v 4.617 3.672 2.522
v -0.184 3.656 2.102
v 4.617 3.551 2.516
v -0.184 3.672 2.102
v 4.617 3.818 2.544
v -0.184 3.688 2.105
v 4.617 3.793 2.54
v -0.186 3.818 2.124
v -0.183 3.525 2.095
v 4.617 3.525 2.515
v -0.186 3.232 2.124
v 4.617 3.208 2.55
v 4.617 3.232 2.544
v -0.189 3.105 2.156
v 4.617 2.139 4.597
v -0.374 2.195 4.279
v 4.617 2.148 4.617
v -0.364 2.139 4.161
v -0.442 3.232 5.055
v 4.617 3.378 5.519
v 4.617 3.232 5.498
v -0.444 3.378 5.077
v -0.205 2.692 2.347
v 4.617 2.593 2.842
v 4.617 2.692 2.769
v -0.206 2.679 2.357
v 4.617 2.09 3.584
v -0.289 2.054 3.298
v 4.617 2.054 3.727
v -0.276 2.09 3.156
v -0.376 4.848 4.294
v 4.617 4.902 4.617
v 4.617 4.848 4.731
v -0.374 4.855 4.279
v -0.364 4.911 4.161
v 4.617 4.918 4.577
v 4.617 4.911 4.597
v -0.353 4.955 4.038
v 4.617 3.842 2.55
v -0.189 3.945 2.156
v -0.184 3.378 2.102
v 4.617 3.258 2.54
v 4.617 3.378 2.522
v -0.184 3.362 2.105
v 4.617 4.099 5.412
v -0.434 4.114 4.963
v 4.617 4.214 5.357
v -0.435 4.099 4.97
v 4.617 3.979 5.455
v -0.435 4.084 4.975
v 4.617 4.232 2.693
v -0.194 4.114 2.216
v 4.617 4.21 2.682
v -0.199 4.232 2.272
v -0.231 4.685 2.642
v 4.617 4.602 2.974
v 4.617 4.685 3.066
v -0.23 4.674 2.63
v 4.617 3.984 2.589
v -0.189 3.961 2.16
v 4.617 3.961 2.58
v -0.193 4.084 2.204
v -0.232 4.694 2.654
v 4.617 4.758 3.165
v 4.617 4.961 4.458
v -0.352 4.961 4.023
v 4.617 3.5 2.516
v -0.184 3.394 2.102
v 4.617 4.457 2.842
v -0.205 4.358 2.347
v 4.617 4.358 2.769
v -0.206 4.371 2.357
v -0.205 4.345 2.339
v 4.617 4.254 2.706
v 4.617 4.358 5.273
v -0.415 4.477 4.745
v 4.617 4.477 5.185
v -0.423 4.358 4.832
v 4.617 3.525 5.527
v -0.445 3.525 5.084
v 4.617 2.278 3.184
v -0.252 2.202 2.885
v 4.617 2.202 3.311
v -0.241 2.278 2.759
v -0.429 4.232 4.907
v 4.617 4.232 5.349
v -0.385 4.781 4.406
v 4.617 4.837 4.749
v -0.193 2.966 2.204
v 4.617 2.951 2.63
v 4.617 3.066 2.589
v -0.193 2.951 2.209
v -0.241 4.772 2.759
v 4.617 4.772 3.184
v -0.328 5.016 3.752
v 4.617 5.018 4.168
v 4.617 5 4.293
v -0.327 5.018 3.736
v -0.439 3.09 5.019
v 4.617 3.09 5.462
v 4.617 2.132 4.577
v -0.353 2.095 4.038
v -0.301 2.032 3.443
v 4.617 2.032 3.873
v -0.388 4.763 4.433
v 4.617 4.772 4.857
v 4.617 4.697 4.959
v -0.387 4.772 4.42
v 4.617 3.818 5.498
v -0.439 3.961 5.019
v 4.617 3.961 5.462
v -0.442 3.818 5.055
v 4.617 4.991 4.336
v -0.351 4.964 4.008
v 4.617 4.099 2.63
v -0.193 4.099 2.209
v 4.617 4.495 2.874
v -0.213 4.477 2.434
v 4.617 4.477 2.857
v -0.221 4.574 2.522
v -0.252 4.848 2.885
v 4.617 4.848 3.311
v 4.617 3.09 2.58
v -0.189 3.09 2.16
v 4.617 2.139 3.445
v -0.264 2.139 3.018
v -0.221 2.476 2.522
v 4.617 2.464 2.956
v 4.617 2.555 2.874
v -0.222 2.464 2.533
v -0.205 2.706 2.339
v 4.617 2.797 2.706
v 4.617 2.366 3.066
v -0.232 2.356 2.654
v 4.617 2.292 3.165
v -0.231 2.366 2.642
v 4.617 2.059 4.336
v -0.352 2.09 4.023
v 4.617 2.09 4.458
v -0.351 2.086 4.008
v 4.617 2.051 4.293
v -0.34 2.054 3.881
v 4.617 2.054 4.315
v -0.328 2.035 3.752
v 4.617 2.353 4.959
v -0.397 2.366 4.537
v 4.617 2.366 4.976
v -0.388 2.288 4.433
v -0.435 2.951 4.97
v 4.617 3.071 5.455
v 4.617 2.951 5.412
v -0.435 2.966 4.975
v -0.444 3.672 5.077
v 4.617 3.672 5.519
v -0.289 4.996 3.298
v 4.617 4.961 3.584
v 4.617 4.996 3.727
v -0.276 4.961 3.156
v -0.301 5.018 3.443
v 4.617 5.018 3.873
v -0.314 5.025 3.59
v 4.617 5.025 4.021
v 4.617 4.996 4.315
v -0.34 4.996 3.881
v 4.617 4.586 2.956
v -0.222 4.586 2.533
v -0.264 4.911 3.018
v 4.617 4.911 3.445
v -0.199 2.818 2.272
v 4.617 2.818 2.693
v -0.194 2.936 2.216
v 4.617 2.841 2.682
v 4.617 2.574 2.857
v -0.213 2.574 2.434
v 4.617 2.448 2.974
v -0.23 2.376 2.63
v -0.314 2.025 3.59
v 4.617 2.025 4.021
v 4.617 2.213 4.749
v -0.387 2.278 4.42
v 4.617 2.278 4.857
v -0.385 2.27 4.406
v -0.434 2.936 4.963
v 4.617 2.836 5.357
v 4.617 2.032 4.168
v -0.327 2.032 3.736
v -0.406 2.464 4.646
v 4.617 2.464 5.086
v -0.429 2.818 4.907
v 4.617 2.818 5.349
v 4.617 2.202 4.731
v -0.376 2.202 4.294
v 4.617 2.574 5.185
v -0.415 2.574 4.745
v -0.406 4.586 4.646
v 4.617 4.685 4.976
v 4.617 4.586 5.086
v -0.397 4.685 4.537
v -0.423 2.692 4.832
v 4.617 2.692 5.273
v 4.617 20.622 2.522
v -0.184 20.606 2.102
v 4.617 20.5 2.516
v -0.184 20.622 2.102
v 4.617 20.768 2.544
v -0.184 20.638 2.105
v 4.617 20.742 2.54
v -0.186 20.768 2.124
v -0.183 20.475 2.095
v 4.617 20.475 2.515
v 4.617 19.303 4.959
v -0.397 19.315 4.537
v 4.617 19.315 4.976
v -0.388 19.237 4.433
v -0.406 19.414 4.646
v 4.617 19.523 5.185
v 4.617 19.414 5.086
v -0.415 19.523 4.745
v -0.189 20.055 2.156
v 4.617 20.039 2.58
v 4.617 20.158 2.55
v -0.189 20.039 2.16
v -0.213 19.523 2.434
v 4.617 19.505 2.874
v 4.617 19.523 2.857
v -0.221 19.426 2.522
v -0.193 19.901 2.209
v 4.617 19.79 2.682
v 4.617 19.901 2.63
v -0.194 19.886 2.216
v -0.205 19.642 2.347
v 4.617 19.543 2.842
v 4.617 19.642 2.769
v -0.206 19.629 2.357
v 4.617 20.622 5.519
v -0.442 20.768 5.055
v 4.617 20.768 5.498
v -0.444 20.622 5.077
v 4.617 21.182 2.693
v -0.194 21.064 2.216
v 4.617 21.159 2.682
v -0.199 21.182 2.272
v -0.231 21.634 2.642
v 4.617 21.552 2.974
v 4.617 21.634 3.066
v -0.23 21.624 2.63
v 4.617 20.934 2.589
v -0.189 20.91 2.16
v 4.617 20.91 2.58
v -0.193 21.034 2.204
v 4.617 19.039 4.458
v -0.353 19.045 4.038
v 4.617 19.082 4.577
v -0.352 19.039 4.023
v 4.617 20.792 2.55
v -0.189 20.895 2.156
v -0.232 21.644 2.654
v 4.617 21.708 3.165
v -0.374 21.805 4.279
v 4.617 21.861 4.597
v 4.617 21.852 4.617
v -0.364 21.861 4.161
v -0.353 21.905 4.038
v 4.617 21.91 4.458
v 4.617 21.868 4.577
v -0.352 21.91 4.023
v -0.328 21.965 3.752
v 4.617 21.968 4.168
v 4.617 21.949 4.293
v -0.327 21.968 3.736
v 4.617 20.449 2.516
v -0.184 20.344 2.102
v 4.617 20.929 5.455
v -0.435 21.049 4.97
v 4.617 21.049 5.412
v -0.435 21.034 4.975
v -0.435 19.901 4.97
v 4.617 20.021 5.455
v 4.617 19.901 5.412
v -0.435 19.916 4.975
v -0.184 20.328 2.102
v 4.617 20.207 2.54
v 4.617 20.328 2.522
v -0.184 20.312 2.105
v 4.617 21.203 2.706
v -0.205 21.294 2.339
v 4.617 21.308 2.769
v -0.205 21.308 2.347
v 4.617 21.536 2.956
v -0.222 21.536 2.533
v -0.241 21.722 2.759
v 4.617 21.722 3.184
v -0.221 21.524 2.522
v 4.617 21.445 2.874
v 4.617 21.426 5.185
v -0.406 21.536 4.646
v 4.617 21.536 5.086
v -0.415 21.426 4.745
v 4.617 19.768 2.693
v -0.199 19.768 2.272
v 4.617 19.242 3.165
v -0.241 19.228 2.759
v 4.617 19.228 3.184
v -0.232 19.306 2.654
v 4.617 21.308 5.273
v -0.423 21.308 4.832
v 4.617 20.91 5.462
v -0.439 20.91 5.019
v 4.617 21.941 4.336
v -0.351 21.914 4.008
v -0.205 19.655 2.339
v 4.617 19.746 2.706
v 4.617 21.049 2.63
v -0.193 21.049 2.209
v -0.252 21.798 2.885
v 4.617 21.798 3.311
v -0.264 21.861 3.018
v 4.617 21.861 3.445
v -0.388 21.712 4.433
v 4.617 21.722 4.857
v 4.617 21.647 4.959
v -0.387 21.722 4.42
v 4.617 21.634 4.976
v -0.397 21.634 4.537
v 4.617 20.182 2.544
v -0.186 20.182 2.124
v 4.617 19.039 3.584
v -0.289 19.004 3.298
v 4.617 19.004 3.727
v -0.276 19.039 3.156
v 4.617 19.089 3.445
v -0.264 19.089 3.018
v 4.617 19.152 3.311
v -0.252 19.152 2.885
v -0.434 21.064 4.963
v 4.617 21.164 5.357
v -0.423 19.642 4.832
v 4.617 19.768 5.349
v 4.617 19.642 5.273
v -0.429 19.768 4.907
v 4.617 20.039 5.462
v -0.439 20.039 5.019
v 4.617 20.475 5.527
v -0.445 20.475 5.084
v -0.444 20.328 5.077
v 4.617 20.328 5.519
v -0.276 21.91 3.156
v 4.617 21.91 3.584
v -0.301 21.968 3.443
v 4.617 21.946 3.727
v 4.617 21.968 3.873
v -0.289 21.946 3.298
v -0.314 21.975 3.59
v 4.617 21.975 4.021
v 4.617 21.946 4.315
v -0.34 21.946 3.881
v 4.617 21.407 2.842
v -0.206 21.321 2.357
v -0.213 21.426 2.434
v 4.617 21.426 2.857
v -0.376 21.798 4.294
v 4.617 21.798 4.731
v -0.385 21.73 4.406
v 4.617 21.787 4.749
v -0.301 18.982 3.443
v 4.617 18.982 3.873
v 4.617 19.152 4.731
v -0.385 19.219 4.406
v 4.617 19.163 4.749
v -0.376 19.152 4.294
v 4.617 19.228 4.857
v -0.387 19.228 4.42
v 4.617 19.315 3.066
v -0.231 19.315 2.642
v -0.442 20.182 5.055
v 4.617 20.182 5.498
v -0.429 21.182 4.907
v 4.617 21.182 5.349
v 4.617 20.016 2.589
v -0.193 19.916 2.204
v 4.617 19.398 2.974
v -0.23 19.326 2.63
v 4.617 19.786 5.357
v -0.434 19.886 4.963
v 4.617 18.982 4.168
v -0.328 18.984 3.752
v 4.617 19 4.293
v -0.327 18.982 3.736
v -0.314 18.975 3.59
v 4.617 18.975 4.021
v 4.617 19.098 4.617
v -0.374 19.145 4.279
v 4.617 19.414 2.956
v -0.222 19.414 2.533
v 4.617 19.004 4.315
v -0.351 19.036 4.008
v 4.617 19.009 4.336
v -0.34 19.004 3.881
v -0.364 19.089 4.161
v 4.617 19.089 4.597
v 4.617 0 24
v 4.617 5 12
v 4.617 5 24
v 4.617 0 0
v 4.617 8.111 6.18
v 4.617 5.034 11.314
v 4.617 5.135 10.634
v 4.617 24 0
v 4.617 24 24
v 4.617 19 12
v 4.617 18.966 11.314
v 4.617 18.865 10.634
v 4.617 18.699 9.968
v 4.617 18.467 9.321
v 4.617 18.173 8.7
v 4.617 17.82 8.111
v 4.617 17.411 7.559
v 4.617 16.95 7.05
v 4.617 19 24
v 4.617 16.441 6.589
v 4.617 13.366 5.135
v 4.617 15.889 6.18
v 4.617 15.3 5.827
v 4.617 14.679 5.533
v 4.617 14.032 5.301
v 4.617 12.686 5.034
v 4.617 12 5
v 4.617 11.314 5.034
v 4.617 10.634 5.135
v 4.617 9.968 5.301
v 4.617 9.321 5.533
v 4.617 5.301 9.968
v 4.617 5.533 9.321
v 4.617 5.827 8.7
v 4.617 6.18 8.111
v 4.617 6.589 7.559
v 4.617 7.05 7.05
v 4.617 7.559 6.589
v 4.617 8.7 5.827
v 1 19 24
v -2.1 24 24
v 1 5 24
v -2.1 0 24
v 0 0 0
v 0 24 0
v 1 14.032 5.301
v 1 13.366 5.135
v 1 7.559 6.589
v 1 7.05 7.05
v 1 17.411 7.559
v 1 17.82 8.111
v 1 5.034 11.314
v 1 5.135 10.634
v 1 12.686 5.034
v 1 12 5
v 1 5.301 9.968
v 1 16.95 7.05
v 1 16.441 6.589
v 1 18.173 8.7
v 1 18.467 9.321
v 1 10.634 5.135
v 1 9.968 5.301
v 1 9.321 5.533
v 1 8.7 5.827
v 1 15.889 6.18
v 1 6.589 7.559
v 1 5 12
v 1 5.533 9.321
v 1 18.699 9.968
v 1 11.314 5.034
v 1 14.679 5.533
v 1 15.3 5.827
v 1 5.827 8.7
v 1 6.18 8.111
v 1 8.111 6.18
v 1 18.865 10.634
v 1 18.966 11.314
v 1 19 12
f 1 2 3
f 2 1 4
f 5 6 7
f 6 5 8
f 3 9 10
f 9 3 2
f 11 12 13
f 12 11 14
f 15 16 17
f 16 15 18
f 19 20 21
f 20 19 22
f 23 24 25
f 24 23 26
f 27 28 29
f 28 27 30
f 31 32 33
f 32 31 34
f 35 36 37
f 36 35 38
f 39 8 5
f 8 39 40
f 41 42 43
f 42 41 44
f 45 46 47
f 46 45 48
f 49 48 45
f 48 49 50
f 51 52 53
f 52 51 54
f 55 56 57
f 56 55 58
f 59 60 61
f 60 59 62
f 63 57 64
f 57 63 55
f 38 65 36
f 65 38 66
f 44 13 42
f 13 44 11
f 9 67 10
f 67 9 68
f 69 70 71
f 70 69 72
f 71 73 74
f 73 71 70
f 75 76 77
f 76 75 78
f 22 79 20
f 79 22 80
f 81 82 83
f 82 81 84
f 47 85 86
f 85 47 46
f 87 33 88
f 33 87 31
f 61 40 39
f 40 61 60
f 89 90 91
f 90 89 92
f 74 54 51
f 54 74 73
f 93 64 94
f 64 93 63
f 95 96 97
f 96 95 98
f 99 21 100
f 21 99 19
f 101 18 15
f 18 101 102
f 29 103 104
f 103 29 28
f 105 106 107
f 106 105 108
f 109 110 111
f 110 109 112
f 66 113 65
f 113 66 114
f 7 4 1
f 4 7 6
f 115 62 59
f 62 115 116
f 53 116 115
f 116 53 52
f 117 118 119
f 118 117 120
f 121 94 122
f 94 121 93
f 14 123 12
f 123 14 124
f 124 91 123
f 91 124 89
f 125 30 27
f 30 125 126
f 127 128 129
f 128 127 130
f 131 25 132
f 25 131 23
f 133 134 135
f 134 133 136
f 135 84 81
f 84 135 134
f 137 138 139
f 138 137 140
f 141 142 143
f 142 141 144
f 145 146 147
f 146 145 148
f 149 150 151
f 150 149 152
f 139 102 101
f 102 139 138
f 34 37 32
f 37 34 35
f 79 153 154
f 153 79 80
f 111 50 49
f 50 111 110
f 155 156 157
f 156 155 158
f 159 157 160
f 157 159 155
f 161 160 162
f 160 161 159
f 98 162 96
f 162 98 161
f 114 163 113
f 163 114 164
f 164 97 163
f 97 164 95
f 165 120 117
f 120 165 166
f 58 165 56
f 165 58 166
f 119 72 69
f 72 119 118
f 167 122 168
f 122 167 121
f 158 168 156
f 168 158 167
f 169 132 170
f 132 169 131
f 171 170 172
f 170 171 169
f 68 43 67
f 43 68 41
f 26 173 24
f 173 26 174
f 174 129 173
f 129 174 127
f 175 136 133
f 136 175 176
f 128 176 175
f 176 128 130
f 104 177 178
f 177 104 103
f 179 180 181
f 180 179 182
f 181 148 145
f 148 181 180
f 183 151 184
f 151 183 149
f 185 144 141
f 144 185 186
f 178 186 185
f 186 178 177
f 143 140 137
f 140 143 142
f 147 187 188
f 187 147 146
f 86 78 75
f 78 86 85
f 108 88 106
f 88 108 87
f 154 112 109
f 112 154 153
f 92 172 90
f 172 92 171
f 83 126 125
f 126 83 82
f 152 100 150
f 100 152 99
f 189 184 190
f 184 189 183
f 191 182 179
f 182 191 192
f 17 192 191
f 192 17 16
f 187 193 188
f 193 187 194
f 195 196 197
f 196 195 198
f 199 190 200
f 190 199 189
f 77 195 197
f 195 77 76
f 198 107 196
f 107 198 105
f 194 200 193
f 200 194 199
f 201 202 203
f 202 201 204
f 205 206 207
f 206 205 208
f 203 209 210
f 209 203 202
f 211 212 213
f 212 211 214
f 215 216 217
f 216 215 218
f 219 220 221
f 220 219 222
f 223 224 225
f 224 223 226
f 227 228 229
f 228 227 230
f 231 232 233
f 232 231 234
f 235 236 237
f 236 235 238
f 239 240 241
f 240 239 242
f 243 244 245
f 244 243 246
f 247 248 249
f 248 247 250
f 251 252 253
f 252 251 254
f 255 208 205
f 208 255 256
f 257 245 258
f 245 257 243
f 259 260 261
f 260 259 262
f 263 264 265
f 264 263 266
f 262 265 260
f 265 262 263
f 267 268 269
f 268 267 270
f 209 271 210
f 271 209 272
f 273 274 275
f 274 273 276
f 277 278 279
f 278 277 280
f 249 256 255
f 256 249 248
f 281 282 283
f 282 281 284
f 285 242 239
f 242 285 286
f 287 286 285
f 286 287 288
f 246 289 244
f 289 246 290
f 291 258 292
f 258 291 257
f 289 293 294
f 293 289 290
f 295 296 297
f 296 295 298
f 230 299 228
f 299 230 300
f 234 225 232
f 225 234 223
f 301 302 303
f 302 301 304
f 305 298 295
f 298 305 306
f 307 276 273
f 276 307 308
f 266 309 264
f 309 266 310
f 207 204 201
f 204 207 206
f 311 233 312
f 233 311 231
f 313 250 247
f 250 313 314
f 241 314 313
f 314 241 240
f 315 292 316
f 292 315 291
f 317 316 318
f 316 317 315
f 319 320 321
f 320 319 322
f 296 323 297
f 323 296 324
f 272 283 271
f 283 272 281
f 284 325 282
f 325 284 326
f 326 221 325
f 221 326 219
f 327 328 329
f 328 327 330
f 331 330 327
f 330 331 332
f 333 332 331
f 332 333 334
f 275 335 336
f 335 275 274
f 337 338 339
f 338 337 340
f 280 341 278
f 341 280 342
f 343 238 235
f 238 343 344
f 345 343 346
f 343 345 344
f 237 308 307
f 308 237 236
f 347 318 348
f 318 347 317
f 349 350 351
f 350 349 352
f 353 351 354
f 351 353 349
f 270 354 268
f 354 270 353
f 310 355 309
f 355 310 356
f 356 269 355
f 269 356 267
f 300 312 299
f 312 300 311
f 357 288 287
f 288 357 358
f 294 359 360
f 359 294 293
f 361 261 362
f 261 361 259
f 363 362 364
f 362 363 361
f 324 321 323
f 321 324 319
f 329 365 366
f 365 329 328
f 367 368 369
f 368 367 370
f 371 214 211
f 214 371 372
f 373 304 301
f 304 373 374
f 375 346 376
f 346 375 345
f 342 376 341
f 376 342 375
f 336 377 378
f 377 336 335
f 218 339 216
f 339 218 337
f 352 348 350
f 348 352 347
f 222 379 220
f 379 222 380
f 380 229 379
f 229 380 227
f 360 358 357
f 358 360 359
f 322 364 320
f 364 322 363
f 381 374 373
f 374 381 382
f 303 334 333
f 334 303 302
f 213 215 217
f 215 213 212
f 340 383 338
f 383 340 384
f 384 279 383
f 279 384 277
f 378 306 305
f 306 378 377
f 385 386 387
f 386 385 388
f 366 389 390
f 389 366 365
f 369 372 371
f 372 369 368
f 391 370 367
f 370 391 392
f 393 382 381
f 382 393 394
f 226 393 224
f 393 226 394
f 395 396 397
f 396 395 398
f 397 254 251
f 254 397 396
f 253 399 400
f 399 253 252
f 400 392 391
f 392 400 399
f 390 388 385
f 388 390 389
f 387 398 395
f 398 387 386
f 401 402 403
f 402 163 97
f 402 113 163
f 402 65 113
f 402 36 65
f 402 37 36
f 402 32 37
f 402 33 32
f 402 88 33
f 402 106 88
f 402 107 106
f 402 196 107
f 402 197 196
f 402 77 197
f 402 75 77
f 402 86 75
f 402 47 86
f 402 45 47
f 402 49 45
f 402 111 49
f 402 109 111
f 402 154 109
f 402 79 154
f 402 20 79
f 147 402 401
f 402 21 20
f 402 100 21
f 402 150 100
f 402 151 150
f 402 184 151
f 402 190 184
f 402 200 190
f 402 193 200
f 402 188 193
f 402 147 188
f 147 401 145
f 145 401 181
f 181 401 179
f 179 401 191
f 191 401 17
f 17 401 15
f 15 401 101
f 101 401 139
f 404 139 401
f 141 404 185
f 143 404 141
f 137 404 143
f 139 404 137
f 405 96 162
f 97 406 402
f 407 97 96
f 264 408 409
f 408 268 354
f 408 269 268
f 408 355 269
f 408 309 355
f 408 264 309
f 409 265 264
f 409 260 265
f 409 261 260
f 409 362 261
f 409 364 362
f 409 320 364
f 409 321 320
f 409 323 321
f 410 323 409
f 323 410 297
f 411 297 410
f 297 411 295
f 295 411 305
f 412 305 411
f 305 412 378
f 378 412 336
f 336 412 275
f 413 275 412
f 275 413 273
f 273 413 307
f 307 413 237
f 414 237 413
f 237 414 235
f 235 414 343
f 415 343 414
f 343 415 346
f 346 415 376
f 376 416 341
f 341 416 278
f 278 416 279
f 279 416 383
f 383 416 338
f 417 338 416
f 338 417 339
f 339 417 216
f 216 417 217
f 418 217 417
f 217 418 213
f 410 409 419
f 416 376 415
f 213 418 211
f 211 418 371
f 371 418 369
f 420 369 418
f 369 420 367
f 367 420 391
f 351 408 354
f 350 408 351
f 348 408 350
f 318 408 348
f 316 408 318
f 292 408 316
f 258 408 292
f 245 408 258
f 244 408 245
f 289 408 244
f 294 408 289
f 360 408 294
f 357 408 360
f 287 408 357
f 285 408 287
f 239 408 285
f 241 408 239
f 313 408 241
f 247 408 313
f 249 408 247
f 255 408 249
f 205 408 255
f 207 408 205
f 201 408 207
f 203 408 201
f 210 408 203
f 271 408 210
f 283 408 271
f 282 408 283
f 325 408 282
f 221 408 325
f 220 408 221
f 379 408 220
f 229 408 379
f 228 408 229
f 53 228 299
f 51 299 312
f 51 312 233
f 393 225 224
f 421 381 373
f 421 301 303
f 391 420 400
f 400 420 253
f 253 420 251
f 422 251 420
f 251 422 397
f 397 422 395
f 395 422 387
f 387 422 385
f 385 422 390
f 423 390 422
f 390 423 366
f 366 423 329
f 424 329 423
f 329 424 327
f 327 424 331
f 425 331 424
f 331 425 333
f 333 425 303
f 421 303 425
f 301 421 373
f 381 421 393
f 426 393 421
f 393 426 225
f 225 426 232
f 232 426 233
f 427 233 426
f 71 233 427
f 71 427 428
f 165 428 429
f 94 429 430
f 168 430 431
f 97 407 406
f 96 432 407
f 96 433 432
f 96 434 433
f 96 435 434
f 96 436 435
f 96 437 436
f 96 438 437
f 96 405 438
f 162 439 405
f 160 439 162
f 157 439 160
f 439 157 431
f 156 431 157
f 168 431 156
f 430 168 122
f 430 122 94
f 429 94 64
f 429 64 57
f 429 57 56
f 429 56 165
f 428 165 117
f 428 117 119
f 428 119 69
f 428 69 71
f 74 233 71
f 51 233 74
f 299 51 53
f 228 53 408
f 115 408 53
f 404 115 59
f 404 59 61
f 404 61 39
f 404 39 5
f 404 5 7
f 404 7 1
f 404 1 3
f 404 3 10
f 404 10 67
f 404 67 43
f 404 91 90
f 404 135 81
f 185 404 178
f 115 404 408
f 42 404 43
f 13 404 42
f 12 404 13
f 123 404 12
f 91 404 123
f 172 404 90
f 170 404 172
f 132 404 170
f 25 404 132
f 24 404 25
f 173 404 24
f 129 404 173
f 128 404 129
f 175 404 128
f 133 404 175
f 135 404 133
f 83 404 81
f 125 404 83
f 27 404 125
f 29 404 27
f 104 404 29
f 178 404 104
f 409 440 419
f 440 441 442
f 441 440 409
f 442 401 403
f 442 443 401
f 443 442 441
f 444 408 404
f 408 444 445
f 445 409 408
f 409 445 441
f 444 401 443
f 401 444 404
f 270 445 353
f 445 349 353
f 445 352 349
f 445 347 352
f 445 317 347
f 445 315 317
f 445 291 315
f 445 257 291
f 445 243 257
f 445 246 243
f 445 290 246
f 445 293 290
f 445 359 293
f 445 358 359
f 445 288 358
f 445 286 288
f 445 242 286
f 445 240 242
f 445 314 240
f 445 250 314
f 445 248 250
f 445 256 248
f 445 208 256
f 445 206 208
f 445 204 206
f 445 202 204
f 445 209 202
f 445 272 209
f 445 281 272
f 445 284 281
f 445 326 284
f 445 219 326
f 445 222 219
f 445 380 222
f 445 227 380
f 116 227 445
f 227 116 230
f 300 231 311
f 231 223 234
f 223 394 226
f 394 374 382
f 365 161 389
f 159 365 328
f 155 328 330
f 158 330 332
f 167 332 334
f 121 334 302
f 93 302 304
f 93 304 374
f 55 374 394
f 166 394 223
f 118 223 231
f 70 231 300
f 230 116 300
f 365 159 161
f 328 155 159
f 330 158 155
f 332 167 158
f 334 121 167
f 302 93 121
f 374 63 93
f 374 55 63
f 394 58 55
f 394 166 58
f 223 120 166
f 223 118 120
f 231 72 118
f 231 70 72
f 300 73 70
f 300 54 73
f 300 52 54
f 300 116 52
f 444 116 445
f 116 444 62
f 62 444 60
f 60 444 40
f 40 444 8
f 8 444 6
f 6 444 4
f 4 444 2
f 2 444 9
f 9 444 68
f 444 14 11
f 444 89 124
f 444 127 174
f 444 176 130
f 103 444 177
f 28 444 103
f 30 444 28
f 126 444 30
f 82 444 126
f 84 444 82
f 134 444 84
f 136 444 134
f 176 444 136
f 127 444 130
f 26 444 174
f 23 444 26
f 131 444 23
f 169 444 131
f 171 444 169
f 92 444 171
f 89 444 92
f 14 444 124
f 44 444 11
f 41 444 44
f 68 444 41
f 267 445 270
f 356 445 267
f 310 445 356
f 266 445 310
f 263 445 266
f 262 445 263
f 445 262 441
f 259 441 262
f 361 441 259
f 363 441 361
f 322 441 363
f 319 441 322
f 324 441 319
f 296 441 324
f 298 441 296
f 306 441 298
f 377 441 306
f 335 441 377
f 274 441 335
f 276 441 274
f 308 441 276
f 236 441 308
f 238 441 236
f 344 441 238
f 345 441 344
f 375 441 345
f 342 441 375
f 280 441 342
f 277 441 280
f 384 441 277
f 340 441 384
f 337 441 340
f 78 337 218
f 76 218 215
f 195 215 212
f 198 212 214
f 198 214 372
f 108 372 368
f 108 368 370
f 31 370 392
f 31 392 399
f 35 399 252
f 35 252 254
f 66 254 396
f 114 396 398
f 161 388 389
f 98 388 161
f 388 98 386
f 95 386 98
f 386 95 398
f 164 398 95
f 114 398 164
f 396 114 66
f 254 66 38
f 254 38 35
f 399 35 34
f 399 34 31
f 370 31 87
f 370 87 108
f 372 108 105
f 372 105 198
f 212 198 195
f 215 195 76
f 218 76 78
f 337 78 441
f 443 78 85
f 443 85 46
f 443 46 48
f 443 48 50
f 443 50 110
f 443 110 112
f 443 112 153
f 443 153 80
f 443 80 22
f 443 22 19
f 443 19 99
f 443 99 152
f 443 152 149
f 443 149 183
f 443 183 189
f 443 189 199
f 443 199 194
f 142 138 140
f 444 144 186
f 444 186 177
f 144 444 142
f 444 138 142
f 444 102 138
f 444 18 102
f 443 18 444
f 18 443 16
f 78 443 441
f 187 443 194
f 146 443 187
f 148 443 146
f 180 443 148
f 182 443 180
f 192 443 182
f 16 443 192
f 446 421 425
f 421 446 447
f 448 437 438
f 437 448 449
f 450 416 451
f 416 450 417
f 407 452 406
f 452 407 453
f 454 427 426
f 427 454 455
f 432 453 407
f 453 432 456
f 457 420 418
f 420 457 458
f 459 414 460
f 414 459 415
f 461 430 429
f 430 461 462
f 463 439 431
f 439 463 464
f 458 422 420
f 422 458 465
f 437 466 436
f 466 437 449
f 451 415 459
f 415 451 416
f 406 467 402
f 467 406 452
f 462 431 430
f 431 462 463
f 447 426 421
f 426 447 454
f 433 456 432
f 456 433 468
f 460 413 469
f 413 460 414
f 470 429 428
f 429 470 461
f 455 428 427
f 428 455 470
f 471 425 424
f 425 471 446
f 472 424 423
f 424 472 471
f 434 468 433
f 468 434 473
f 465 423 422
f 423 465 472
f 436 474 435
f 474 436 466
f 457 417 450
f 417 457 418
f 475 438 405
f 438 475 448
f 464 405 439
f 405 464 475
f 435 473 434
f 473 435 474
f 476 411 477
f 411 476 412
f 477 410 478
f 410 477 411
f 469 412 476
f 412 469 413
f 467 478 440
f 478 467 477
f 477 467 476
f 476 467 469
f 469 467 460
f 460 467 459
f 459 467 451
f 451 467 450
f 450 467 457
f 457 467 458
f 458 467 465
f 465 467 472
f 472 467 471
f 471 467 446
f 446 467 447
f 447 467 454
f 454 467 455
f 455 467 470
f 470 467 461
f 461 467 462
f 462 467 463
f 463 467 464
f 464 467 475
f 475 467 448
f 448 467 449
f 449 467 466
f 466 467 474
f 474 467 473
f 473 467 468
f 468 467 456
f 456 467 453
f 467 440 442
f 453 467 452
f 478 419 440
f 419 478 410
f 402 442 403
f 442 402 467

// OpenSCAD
$fn = $preview ? 16 : 64;

dia = 14;
T = 1;
D = T+dia/3;
w = dia + 10;
h = dia + 10;

bevel = 5;

difference() {
        translate([-h*tan(bevel), 0, 0]) cube([D+h*tan(bevel)/2, w, h]);
        rotate([0,-bevel, 0]) translate([-h * sin(bevel), 0, 0]) cube([h*sin(bevel), w, h/cos(bevel)]);
        translate([T, w/2, h/2]) rotate([0, 90, 0]) cylinder(d=dia, h=D - T);
        translate([T, (w-dia)/2,(h/2)]) cube([D-T, dia, h/2]);
        let(factor = (1 - dia/sqrt(h*h + w*w))/4) {
                translate([-h*tan(bevel)/2, w*factor, h * factor]) rotate([0, 90 - bevel, 0]) cylinder(d = 3, h = D+h*tan(bevel)/2);
                translate([-h*tan(bevel)/2, w*(1-factor), h * factor]) rotate([0, 90 - bevel, 0]) cylinder(d = 3, h = D+h*tan(bevel)/2);
        }
}
